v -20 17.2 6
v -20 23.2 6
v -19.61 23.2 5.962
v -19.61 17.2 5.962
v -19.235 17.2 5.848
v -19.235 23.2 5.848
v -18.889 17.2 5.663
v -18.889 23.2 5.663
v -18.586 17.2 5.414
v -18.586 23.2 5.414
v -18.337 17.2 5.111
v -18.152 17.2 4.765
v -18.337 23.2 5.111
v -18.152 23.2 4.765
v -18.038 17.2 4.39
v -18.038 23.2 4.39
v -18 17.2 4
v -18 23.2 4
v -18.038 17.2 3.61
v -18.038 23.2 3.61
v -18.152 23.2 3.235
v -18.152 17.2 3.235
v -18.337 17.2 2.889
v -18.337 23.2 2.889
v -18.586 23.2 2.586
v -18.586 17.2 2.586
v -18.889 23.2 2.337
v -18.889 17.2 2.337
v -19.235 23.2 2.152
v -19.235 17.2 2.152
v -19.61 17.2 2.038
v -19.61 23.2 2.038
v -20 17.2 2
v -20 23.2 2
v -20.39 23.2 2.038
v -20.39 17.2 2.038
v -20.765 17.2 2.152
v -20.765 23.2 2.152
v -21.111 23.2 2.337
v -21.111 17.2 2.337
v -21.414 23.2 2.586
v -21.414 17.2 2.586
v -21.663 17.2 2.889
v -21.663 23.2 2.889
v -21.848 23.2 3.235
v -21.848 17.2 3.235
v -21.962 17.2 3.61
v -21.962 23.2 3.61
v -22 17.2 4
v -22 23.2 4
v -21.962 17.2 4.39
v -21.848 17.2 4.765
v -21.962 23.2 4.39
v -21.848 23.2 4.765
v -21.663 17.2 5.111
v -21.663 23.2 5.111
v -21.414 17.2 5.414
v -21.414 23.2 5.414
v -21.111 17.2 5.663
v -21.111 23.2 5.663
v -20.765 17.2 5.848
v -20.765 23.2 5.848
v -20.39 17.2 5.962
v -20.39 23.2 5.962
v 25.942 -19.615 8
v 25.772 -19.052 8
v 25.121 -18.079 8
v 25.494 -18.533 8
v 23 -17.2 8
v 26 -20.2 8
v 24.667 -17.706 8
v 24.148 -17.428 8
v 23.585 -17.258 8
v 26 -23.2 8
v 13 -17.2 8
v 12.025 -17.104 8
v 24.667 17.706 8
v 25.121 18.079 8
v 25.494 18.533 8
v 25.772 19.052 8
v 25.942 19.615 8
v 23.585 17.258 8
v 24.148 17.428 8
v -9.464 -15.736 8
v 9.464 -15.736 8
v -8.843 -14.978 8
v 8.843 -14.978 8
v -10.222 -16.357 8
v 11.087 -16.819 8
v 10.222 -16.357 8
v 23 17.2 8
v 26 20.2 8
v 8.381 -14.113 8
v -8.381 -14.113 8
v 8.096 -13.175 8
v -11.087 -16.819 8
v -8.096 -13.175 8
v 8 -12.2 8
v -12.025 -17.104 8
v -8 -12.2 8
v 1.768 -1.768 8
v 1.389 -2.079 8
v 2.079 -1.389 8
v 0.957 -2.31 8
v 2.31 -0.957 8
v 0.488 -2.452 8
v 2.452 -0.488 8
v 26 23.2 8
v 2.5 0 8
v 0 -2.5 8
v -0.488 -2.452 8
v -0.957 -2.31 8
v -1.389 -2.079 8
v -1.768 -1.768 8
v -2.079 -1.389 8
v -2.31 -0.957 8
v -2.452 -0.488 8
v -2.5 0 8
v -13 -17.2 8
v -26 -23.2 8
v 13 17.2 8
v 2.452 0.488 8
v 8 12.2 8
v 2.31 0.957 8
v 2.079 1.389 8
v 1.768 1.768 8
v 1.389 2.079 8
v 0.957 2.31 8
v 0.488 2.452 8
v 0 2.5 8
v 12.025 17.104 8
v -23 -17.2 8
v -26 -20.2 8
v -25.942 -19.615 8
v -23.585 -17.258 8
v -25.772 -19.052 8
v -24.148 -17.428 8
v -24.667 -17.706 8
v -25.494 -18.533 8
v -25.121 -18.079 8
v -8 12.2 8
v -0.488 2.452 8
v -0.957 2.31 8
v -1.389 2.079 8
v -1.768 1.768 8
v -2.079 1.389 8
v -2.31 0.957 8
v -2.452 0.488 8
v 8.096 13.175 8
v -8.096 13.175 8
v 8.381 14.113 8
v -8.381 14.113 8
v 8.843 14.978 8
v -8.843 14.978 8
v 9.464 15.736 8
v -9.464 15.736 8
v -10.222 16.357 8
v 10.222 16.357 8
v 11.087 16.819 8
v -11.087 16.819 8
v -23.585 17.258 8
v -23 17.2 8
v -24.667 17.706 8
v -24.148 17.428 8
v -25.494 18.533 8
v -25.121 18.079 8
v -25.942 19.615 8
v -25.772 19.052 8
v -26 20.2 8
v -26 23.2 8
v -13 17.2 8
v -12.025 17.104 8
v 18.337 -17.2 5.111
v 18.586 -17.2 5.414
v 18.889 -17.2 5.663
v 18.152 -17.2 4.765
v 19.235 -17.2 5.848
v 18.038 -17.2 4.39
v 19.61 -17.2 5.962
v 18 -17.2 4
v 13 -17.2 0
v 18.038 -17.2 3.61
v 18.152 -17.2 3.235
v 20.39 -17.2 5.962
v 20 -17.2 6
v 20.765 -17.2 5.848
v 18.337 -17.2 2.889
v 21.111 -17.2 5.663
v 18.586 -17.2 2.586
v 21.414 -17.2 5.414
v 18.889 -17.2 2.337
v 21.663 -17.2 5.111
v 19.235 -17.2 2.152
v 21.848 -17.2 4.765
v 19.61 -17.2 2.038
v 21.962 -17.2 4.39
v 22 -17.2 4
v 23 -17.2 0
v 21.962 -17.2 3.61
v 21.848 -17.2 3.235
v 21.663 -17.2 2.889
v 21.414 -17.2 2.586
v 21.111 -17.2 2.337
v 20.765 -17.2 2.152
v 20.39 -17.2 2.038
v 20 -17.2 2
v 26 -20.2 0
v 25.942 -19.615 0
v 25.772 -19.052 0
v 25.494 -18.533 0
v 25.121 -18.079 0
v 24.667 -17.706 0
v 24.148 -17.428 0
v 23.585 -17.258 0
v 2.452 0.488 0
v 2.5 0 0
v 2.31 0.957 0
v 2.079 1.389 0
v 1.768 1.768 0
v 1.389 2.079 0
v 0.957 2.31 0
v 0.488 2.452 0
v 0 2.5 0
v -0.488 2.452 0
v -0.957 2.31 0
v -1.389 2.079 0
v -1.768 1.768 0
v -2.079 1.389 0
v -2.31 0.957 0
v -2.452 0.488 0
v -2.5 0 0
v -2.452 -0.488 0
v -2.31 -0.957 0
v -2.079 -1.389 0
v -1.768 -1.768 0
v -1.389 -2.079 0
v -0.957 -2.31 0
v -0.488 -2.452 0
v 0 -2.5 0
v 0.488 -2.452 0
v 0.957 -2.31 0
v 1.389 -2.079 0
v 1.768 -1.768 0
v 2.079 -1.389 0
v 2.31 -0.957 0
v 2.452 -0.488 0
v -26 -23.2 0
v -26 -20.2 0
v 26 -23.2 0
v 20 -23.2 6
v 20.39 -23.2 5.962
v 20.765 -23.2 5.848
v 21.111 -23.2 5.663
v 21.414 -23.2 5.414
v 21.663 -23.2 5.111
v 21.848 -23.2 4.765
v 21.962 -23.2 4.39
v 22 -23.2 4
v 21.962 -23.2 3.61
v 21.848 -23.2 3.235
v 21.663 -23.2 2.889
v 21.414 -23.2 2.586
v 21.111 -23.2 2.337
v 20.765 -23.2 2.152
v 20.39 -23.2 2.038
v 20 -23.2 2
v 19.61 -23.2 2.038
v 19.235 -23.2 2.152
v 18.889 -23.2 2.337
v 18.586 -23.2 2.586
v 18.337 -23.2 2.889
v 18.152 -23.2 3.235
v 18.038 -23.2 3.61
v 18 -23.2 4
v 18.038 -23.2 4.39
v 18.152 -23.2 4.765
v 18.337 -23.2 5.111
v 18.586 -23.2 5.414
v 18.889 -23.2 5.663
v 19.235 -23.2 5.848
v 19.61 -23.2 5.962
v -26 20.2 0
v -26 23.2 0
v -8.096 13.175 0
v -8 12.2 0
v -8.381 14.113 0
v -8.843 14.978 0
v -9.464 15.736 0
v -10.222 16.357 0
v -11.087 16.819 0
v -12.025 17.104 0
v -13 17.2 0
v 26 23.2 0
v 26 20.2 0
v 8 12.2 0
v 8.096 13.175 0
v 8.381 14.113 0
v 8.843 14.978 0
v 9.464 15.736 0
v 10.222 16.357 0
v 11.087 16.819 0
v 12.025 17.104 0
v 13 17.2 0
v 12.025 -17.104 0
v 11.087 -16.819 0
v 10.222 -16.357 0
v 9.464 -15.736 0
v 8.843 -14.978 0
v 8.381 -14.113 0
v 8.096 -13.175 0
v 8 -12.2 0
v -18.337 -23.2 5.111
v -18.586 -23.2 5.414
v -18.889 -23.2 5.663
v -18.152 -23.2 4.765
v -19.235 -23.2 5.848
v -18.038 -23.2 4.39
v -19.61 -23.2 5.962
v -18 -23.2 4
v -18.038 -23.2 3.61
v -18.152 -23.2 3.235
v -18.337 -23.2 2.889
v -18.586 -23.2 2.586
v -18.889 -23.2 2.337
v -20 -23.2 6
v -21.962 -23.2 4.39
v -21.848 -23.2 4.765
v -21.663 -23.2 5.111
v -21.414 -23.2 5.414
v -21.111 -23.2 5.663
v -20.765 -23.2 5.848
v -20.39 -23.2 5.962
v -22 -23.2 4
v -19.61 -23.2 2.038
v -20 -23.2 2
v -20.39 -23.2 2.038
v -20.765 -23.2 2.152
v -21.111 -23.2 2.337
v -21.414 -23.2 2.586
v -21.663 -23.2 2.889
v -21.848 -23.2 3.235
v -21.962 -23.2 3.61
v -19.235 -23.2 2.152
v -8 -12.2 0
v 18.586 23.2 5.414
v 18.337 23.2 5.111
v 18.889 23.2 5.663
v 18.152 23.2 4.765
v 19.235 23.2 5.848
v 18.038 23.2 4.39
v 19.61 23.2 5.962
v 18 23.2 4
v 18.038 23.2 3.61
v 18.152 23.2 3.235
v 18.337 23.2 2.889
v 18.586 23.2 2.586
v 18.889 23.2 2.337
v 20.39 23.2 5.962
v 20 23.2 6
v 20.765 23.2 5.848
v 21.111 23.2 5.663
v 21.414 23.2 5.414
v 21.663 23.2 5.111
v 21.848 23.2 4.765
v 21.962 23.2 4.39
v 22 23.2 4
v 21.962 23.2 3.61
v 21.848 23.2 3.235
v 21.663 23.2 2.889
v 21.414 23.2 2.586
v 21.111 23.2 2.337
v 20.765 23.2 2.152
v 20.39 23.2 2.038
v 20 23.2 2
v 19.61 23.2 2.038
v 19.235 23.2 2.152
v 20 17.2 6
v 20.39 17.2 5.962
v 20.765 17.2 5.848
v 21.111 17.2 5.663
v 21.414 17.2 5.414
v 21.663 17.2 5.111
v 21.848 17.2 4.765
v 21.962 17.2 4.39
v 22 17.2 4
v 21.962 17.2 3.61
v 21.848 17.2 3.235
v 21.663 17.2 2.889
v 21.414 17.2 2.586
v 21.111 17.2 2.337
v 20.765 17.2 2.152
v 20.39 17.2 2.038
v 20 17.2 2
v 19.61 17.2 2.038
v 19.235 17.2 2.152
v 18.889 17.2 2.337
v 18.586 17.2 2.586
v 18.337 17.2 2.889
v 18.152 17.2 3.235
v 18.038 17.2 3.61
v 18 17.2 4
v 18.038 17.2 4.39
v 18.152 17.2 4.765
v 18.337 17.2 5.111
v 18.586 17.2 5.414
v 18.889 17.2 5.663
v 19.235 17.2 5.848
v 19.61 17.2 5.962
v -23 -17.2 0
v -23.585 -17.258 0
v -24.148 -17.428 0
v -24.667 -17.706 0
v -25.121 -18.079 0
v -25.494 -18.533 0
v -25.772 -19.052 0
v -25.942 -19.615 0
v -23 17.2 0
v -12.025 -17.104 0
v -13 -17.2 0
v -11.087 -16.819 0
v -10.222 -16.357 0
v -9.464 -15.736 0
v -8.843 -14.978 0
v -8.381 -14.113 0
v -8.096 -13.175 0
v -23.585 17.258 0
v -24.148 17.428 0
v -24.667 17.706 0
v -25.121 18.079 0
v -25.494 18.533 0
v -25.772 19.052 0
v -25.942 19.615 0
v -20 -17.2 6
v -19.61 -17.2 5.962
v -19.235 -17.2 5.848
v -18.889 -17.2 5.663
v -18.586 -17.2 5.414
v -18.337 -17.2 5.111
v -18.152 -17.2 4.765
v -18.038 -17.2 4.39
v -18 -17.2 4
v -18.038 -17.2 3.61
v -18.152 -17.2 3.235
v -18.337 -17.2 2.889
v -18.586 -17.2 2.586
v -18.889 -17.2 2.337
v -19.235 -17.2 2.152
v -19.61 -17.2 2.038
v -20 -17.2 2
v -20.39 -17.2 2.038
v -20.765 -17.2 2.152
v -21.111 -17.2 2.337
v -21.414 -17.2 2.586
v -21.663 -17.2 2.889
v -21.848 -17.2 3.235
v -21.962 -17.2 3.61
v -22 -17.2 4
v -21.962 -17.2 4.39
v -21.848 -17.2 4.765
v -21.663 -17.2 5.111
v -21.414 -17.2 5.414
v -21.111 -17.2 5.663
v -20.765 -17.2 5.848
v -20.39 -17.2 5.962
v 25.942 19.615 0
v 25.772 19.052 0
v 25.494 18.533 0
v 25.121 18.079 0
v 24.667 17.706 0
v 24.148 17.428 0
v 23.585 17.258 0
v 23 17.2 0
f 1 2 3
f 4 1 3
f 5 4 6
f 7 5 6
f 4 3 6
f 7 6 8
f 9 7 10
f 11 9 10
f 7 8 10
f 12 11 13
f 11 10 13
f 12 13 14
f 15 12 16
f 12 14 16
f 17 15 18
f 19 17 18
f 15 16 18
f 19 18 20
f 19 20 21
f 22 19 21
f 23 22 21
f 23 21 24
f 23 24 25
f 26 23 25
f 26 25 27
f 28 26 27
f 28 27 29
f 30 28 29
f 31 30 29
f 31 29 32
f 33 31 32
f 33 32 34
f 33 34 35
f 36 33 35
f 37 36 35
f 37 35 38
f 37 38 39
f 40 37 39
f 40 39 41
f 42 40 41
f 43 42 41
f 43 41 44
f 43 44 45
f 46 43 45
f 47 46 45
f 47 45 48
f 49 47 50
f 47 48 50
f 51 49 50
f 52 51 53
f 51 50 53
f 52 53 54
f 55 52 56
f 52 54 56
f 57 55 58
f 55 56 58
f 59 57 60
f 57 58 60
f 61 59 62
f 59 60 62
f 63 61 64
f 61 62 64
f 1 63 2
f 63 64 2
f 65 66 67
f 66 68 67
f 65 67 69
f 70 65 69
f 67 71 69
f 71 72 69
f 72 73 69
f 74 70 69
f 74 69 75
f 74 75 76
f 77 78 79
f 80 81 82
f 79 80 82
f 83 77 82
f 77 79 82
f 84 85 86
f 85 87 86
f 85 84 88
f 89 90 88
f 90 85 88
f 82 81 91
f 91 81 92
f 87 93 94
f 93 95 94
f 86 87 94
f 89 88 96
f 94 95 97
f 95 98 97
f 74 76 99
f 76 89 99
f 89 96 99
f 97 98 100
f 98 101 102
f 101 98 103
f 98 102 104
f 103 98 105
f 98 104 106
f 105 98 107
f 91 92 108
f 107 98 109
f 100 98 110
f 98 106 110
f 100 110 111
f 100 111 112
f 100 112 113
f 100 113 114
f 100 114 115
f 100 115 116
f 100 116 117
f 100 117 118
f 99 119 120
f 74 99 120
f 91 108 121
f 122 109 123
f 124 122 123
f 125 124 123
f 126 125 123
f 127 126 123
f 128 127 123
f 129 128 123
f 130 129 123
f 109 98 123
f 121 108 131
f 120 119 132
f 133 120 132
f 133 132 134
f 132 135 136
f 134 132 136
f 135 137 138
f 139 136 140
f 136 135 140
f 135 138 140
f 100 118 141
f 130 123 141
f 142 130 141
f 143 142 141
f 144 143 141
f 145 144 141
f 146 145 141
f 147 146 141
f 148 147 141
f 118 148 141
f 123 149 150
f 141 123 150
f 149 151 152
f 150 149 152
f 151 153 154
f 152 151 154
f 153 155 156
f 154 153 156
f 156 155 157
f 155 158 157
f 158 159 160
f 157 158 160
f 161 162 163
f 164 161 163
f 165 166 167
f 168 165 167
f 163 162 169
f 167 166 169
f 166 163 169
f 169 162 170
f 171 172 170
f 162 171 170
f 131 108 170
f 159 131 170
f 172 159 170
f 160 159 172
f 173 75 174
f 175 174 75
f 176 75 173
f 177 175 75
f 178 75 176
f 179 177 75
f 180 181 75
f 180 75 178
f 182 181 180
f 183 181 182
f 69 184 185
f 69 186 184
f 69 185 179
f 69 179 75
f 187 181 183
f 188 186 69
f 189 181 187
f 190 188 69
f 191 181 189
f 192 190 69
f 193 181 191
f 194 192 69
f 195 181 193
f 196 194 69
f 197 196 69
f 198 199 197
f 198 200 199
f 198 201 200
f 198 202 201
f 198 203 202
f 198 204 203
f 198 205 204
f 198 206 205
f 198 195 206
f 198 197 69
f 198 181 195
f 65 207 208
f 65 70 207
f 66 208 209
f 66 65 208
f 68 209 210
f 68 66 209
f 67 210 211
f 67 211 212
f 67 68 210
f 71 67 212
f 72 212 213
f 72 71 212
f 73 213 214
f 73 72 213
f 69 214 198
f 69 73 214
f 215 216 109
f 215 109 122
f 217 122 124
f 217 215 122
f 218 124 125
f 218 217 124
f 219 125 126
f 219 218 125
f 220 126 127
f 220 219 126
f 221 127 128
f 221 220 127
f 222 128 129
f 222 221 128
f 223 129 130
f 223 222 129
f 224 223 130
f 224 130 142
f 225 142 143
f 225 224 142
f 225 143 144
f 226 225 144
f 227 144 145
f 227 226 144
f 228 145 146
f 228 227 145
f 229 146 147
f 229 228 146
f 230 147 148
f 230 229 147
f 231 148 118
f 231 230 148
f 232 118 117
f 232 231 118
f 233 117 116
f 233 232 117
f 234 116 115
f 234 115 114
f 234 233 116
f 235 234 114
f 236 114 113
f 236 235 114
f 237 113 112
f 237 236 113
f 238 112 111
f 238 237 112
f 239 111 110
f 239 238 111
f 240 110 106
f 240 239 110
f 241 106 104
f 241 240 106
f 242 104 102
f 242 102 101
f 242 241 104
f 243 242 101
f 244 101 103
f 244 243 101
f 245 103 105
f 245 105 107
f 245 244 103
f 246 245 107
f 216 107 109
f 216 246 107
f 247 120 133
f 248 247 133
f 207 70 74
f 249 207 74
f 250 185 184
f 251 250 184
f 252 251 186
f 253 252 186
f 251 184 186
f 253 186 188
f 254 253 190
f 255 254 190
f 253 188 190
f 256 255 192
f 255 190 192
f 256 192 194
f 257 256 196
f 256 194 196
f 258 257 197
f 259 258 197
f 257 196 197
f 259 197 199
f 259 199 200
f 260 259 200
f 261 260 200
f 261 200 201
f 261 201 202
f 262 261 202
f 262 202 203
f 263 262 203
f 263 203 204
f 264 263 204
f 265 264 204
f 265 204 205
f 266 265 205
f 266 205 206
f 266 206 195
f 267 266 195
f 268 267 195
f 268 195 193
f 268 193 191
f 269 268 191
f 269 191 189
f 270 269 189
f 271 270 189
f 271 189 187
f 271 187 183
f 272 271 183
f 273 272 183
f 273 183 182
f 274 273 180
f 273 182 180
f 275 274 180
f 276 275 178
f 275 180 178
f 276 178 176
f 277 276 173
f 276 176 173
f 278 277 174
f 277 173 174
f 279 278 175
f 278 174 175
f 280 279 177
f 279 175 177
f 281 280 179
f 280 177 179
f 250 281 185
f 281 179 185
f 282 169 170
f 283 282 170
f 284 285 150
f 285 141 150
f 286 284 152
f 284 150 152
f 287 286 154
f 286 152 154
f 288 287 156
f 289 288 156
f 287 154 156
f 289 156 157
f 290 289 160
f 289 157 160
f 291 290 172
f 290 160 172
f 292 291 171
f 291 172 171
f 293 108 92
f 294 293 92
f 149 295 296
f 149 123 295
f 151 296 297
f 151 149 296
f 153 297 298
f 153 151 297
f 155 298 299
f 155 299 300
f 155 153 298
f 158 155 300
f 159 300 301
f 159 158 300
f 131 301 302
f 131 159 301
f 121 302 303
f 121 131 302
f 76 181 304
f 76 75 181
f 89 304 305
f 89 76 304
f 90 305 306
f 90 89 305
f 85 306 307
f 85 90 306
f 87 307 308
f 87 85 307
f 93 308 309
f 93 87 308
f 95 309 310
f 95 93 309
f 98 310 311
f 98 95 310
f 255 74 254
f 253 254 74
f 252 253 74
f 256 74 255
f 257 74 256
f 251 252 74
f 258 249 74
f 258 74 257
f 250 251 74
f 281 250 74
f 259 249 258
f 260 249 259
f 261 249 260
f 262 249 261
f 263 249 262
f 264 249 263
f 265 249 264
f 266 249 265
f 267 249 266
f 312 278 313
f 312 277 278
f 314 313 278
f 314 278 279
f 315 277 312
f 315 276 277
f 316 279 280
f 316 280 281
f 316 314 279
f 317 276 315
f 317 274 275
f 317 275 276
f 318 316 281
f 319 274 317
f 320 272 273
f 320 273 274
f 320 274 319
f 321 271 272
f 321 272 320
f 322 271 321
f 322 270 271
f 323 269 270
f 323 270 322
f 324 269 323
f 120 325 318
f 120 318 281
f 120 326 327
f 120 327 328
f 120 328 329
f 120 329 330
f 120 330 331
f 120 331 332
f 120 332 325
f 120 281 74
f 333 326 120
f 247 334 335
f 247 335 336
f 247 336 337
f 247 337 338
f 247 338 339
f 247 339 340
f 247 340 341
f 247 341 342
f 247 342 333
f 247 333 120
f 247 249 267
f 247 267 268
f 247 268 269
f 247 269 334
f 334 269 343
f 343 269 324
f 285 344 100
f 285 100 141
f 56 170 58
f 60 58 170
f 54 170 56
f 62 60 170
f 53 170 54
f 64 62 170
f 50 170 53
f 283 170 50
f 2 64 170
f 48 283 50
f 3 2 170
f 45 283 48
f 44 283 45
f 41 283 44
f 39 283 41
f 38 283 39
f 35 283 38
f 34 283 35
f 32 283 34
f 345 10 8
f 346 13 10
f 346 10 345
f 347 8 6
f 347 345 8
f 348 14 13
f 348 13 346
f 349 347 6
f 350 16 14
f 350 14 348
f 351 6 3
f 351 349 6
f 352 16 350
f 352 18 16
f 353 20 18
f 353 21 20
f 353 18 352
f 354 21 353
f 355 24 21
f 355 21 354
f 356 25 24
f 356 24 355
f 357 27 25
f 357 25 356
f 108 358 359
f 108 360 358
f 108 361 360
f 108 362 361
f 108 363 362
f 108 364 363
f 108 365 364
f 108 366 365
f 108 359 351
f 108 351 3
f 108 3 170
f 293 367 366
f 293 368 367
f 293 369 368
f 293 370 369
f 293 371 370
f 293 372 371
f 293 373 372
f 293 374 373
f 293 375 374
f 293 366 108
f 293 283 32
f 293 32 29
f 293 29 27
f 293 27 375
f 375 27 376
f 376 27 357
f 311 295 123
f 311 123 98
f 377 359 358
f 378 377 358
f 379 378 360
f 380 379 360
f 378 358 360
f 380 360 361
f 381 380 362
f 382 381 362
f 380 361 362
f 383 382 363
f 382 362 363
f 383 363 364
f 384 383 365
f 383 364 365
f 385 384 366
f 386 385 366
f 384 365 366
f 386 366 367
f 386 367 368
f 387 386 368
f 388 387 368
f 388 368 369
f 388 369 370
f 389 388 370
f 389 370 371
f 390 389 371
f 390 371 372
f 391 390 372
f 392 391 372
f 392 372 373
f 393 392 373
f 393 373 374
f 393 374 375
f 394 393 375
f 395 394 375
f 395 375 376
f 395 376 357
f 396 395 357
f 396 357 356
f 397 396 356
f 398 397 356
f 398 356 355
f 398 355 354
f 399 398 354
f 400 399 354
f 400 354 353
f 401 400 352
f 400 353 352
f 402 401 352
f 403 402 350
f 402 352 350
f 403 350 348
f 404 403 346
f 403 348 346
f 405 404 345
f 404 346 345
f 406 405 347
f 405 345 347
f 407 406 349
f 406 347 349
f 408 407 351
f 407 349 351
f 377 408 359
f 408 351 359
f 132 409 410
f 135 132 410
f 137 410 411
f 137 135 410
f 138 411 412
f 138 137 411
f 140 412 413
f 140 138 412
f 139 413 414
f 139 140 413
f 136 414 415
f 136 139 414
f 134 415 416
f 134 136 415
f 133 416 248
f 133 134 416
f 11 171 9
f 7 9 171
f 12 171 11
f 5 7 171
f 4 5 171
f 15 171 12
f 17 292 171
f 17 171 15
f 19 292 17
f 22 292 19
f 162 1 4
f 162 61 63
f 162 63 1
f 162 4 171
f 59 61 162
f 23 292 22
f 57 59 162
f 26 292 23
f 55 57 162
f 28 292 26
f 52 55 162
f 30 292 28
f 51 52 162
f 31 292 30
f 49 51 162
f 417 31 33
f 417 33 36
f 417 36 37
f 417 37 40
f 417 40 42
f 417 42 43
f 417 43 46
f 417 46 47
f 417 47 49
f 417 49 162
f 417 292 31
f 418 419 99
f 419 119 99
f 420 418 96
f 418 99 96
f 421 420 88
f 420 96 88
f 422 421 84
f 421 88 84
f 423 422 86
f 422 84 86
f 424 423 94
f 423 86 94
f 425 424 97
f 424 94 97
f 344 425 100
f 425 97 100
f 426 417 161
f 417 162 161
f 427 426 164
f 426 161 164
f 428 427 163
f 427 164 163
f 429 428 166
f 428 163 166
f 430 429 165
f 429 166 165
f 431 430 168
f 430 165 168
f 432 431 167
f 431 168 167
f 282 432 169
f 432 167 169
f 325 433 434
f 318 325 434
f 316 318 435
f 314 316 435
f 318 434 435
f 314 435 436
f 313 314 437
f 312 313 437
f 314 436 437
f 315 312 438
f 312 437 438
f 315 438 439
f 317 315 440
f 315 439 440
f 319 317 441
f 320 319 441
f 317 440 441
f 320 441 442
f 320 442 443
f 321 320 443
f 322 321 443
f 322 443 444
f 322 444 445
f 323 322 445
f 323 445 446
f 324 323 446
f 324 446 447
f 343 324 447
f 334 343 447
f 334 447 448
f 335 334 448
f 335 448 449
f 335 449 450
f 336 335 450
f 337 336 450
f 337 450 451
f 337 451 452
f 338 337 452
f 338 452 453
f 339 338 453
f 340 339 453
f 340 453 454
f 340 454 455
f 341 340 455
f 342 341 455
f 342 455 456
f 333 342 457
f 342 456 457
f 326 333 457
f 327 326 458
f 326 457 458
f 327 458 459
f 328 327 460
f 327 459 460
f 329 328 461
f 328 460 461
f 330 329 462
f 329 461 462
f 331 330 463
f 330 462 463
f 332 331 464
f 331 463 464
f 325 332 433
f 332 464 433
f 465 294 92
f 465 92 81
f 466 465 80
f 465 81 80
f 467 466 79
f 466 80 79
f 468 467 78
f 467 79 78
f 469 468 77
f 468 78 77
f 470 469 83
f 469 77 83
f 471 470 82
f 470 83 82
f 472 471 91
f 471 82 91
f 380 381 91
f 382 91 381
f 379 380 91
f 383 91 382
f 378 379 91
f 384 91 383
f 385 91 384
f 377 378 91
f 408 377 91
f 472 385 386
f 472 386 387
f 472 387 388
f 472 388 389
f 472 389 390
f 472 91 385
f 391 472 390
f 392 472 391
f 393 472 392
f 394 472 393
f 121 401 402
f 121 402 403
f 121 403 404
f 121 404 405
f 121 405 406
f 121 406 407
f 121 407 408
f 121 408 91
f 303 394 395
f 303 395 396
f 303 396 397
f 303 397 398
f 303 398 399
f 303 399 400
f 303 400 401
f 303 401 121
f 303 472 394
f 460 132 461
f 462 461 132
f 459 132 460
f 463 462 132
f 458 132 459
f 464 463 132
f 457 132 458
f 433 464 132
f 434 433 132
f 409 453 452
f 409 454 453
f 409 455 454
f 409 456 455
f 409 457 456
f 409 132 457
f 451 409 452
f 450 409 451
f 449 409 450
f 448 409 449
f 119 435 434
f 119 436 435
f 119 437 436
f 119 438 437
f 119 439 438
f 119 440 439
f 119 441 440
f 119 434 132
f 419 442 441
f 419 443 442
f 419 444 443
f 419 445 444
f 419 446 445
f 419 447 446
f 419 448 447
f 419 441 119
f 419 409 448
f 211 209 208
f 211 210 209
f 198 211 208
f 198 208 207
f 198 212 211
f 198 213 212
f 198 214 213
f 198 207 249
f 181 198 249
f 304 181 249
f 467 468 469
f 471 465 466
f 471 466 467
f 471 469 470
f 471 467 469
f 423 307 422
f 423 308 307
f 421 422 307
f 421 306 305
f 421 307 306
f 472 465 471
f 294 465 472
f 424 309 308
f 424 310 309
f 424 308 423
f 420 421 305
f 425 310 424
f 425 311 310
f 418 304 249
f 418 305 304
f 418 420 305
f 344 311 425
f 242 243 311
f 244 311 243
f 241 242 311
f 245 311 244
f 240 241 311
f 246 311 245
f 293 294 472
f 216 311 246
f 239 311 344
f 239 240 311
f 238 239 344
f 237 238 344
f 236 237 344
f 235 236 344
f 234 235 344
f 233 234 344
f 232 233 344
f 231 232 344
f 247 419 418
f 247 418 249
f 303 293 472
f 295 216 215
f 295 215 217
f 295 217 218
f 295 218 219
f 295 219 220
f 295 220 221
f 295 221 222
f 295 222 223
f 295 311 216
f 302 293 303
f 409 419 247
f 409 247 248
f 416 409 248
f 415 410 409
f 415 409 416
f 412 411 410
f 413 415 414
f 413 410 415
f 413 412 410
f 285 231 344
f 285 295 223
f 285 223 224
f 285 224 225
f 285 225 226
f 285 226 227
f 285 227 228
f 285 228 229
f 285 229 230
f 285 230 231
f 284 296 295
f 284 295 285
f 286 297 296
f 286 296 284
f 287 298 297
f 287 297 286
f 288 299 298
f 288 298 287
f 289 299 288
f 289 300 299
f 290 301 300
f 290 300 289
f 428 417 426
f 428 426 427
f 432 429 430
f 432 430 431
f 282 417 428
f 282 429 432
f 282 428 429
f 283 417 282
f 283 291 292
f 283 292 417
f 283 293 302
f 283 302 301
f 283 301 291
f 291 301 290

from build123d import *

# Parameters (mm, degrees)
SKETCH_1_R          = 2.5
EXTRUDE_1_DEPTH     = 8
SKETCH_2_R          = 2
CUT_EXTRUDE_1_DEPTH = 54.786243594
FILLET_1_R          = 3
FILLET_2_R          = 5


with BuildPart() as part:
    # 草图1 → 凸台-拉伸1 (new body)
    with BuildSketch(Plane.XY):
        Polygon((-8, -17.2), (-8, 17.2), (-26, 17.2), (-26, 23.2), (26, 23.2), (26, 17.2), (8, 17.2), (8, -17.2), (26, -17.2), (26, -23.2), (-26, -23.2), (-26, -17.2), align=None)
        Circle(SKETCH_1_R, mode=Mode.SUBTRACT)
    extrude(amount=EXTRUDE_1_DEPTH)

    # 草图2 → 切除-拉伸1 (cut, through all)
    with BuildSketch(Plane(origin=(0, 23.2, 0), x_dir=(1, 0, 0), z_dir=(0, 1, 0))):
        with Locations(Location((-20, -4, 0), (0, 0, 270))):
            Circle(SKETCH_2_R)
        with Locations(Location((20, -4, 0), (0, 0, 270))):
            Circle(SKETCH_2_R)
    extrude(amount=-CUT_EXTRUDE_1_DEPTH, mode=Mode.SUBTRACT)

    # 圆角1
    fillet_1_edges = [part.edges().sort_by_distance(p)[0] for p in [
        (-26, 17.2, 4),
        (26, 17.2, 4),
        (26, -17.2, 4),
        (-26, -17.2, 4),
    ]]
    fillet(fillet_1_edges, radius=FILLET_1_R)

    # 圆角2
    fillet_2_edges = [part.edges().sort_by_distance(p)[0] for p in [
        (8, 17.2, 4),
        (8, -17.2, 4),
        (-8, -17.2, 4),
        (-8, 17.2, 4),
    ]]
    fillet(fillet_2_edges, radius=FILLET_2_R)


solid = part.part
